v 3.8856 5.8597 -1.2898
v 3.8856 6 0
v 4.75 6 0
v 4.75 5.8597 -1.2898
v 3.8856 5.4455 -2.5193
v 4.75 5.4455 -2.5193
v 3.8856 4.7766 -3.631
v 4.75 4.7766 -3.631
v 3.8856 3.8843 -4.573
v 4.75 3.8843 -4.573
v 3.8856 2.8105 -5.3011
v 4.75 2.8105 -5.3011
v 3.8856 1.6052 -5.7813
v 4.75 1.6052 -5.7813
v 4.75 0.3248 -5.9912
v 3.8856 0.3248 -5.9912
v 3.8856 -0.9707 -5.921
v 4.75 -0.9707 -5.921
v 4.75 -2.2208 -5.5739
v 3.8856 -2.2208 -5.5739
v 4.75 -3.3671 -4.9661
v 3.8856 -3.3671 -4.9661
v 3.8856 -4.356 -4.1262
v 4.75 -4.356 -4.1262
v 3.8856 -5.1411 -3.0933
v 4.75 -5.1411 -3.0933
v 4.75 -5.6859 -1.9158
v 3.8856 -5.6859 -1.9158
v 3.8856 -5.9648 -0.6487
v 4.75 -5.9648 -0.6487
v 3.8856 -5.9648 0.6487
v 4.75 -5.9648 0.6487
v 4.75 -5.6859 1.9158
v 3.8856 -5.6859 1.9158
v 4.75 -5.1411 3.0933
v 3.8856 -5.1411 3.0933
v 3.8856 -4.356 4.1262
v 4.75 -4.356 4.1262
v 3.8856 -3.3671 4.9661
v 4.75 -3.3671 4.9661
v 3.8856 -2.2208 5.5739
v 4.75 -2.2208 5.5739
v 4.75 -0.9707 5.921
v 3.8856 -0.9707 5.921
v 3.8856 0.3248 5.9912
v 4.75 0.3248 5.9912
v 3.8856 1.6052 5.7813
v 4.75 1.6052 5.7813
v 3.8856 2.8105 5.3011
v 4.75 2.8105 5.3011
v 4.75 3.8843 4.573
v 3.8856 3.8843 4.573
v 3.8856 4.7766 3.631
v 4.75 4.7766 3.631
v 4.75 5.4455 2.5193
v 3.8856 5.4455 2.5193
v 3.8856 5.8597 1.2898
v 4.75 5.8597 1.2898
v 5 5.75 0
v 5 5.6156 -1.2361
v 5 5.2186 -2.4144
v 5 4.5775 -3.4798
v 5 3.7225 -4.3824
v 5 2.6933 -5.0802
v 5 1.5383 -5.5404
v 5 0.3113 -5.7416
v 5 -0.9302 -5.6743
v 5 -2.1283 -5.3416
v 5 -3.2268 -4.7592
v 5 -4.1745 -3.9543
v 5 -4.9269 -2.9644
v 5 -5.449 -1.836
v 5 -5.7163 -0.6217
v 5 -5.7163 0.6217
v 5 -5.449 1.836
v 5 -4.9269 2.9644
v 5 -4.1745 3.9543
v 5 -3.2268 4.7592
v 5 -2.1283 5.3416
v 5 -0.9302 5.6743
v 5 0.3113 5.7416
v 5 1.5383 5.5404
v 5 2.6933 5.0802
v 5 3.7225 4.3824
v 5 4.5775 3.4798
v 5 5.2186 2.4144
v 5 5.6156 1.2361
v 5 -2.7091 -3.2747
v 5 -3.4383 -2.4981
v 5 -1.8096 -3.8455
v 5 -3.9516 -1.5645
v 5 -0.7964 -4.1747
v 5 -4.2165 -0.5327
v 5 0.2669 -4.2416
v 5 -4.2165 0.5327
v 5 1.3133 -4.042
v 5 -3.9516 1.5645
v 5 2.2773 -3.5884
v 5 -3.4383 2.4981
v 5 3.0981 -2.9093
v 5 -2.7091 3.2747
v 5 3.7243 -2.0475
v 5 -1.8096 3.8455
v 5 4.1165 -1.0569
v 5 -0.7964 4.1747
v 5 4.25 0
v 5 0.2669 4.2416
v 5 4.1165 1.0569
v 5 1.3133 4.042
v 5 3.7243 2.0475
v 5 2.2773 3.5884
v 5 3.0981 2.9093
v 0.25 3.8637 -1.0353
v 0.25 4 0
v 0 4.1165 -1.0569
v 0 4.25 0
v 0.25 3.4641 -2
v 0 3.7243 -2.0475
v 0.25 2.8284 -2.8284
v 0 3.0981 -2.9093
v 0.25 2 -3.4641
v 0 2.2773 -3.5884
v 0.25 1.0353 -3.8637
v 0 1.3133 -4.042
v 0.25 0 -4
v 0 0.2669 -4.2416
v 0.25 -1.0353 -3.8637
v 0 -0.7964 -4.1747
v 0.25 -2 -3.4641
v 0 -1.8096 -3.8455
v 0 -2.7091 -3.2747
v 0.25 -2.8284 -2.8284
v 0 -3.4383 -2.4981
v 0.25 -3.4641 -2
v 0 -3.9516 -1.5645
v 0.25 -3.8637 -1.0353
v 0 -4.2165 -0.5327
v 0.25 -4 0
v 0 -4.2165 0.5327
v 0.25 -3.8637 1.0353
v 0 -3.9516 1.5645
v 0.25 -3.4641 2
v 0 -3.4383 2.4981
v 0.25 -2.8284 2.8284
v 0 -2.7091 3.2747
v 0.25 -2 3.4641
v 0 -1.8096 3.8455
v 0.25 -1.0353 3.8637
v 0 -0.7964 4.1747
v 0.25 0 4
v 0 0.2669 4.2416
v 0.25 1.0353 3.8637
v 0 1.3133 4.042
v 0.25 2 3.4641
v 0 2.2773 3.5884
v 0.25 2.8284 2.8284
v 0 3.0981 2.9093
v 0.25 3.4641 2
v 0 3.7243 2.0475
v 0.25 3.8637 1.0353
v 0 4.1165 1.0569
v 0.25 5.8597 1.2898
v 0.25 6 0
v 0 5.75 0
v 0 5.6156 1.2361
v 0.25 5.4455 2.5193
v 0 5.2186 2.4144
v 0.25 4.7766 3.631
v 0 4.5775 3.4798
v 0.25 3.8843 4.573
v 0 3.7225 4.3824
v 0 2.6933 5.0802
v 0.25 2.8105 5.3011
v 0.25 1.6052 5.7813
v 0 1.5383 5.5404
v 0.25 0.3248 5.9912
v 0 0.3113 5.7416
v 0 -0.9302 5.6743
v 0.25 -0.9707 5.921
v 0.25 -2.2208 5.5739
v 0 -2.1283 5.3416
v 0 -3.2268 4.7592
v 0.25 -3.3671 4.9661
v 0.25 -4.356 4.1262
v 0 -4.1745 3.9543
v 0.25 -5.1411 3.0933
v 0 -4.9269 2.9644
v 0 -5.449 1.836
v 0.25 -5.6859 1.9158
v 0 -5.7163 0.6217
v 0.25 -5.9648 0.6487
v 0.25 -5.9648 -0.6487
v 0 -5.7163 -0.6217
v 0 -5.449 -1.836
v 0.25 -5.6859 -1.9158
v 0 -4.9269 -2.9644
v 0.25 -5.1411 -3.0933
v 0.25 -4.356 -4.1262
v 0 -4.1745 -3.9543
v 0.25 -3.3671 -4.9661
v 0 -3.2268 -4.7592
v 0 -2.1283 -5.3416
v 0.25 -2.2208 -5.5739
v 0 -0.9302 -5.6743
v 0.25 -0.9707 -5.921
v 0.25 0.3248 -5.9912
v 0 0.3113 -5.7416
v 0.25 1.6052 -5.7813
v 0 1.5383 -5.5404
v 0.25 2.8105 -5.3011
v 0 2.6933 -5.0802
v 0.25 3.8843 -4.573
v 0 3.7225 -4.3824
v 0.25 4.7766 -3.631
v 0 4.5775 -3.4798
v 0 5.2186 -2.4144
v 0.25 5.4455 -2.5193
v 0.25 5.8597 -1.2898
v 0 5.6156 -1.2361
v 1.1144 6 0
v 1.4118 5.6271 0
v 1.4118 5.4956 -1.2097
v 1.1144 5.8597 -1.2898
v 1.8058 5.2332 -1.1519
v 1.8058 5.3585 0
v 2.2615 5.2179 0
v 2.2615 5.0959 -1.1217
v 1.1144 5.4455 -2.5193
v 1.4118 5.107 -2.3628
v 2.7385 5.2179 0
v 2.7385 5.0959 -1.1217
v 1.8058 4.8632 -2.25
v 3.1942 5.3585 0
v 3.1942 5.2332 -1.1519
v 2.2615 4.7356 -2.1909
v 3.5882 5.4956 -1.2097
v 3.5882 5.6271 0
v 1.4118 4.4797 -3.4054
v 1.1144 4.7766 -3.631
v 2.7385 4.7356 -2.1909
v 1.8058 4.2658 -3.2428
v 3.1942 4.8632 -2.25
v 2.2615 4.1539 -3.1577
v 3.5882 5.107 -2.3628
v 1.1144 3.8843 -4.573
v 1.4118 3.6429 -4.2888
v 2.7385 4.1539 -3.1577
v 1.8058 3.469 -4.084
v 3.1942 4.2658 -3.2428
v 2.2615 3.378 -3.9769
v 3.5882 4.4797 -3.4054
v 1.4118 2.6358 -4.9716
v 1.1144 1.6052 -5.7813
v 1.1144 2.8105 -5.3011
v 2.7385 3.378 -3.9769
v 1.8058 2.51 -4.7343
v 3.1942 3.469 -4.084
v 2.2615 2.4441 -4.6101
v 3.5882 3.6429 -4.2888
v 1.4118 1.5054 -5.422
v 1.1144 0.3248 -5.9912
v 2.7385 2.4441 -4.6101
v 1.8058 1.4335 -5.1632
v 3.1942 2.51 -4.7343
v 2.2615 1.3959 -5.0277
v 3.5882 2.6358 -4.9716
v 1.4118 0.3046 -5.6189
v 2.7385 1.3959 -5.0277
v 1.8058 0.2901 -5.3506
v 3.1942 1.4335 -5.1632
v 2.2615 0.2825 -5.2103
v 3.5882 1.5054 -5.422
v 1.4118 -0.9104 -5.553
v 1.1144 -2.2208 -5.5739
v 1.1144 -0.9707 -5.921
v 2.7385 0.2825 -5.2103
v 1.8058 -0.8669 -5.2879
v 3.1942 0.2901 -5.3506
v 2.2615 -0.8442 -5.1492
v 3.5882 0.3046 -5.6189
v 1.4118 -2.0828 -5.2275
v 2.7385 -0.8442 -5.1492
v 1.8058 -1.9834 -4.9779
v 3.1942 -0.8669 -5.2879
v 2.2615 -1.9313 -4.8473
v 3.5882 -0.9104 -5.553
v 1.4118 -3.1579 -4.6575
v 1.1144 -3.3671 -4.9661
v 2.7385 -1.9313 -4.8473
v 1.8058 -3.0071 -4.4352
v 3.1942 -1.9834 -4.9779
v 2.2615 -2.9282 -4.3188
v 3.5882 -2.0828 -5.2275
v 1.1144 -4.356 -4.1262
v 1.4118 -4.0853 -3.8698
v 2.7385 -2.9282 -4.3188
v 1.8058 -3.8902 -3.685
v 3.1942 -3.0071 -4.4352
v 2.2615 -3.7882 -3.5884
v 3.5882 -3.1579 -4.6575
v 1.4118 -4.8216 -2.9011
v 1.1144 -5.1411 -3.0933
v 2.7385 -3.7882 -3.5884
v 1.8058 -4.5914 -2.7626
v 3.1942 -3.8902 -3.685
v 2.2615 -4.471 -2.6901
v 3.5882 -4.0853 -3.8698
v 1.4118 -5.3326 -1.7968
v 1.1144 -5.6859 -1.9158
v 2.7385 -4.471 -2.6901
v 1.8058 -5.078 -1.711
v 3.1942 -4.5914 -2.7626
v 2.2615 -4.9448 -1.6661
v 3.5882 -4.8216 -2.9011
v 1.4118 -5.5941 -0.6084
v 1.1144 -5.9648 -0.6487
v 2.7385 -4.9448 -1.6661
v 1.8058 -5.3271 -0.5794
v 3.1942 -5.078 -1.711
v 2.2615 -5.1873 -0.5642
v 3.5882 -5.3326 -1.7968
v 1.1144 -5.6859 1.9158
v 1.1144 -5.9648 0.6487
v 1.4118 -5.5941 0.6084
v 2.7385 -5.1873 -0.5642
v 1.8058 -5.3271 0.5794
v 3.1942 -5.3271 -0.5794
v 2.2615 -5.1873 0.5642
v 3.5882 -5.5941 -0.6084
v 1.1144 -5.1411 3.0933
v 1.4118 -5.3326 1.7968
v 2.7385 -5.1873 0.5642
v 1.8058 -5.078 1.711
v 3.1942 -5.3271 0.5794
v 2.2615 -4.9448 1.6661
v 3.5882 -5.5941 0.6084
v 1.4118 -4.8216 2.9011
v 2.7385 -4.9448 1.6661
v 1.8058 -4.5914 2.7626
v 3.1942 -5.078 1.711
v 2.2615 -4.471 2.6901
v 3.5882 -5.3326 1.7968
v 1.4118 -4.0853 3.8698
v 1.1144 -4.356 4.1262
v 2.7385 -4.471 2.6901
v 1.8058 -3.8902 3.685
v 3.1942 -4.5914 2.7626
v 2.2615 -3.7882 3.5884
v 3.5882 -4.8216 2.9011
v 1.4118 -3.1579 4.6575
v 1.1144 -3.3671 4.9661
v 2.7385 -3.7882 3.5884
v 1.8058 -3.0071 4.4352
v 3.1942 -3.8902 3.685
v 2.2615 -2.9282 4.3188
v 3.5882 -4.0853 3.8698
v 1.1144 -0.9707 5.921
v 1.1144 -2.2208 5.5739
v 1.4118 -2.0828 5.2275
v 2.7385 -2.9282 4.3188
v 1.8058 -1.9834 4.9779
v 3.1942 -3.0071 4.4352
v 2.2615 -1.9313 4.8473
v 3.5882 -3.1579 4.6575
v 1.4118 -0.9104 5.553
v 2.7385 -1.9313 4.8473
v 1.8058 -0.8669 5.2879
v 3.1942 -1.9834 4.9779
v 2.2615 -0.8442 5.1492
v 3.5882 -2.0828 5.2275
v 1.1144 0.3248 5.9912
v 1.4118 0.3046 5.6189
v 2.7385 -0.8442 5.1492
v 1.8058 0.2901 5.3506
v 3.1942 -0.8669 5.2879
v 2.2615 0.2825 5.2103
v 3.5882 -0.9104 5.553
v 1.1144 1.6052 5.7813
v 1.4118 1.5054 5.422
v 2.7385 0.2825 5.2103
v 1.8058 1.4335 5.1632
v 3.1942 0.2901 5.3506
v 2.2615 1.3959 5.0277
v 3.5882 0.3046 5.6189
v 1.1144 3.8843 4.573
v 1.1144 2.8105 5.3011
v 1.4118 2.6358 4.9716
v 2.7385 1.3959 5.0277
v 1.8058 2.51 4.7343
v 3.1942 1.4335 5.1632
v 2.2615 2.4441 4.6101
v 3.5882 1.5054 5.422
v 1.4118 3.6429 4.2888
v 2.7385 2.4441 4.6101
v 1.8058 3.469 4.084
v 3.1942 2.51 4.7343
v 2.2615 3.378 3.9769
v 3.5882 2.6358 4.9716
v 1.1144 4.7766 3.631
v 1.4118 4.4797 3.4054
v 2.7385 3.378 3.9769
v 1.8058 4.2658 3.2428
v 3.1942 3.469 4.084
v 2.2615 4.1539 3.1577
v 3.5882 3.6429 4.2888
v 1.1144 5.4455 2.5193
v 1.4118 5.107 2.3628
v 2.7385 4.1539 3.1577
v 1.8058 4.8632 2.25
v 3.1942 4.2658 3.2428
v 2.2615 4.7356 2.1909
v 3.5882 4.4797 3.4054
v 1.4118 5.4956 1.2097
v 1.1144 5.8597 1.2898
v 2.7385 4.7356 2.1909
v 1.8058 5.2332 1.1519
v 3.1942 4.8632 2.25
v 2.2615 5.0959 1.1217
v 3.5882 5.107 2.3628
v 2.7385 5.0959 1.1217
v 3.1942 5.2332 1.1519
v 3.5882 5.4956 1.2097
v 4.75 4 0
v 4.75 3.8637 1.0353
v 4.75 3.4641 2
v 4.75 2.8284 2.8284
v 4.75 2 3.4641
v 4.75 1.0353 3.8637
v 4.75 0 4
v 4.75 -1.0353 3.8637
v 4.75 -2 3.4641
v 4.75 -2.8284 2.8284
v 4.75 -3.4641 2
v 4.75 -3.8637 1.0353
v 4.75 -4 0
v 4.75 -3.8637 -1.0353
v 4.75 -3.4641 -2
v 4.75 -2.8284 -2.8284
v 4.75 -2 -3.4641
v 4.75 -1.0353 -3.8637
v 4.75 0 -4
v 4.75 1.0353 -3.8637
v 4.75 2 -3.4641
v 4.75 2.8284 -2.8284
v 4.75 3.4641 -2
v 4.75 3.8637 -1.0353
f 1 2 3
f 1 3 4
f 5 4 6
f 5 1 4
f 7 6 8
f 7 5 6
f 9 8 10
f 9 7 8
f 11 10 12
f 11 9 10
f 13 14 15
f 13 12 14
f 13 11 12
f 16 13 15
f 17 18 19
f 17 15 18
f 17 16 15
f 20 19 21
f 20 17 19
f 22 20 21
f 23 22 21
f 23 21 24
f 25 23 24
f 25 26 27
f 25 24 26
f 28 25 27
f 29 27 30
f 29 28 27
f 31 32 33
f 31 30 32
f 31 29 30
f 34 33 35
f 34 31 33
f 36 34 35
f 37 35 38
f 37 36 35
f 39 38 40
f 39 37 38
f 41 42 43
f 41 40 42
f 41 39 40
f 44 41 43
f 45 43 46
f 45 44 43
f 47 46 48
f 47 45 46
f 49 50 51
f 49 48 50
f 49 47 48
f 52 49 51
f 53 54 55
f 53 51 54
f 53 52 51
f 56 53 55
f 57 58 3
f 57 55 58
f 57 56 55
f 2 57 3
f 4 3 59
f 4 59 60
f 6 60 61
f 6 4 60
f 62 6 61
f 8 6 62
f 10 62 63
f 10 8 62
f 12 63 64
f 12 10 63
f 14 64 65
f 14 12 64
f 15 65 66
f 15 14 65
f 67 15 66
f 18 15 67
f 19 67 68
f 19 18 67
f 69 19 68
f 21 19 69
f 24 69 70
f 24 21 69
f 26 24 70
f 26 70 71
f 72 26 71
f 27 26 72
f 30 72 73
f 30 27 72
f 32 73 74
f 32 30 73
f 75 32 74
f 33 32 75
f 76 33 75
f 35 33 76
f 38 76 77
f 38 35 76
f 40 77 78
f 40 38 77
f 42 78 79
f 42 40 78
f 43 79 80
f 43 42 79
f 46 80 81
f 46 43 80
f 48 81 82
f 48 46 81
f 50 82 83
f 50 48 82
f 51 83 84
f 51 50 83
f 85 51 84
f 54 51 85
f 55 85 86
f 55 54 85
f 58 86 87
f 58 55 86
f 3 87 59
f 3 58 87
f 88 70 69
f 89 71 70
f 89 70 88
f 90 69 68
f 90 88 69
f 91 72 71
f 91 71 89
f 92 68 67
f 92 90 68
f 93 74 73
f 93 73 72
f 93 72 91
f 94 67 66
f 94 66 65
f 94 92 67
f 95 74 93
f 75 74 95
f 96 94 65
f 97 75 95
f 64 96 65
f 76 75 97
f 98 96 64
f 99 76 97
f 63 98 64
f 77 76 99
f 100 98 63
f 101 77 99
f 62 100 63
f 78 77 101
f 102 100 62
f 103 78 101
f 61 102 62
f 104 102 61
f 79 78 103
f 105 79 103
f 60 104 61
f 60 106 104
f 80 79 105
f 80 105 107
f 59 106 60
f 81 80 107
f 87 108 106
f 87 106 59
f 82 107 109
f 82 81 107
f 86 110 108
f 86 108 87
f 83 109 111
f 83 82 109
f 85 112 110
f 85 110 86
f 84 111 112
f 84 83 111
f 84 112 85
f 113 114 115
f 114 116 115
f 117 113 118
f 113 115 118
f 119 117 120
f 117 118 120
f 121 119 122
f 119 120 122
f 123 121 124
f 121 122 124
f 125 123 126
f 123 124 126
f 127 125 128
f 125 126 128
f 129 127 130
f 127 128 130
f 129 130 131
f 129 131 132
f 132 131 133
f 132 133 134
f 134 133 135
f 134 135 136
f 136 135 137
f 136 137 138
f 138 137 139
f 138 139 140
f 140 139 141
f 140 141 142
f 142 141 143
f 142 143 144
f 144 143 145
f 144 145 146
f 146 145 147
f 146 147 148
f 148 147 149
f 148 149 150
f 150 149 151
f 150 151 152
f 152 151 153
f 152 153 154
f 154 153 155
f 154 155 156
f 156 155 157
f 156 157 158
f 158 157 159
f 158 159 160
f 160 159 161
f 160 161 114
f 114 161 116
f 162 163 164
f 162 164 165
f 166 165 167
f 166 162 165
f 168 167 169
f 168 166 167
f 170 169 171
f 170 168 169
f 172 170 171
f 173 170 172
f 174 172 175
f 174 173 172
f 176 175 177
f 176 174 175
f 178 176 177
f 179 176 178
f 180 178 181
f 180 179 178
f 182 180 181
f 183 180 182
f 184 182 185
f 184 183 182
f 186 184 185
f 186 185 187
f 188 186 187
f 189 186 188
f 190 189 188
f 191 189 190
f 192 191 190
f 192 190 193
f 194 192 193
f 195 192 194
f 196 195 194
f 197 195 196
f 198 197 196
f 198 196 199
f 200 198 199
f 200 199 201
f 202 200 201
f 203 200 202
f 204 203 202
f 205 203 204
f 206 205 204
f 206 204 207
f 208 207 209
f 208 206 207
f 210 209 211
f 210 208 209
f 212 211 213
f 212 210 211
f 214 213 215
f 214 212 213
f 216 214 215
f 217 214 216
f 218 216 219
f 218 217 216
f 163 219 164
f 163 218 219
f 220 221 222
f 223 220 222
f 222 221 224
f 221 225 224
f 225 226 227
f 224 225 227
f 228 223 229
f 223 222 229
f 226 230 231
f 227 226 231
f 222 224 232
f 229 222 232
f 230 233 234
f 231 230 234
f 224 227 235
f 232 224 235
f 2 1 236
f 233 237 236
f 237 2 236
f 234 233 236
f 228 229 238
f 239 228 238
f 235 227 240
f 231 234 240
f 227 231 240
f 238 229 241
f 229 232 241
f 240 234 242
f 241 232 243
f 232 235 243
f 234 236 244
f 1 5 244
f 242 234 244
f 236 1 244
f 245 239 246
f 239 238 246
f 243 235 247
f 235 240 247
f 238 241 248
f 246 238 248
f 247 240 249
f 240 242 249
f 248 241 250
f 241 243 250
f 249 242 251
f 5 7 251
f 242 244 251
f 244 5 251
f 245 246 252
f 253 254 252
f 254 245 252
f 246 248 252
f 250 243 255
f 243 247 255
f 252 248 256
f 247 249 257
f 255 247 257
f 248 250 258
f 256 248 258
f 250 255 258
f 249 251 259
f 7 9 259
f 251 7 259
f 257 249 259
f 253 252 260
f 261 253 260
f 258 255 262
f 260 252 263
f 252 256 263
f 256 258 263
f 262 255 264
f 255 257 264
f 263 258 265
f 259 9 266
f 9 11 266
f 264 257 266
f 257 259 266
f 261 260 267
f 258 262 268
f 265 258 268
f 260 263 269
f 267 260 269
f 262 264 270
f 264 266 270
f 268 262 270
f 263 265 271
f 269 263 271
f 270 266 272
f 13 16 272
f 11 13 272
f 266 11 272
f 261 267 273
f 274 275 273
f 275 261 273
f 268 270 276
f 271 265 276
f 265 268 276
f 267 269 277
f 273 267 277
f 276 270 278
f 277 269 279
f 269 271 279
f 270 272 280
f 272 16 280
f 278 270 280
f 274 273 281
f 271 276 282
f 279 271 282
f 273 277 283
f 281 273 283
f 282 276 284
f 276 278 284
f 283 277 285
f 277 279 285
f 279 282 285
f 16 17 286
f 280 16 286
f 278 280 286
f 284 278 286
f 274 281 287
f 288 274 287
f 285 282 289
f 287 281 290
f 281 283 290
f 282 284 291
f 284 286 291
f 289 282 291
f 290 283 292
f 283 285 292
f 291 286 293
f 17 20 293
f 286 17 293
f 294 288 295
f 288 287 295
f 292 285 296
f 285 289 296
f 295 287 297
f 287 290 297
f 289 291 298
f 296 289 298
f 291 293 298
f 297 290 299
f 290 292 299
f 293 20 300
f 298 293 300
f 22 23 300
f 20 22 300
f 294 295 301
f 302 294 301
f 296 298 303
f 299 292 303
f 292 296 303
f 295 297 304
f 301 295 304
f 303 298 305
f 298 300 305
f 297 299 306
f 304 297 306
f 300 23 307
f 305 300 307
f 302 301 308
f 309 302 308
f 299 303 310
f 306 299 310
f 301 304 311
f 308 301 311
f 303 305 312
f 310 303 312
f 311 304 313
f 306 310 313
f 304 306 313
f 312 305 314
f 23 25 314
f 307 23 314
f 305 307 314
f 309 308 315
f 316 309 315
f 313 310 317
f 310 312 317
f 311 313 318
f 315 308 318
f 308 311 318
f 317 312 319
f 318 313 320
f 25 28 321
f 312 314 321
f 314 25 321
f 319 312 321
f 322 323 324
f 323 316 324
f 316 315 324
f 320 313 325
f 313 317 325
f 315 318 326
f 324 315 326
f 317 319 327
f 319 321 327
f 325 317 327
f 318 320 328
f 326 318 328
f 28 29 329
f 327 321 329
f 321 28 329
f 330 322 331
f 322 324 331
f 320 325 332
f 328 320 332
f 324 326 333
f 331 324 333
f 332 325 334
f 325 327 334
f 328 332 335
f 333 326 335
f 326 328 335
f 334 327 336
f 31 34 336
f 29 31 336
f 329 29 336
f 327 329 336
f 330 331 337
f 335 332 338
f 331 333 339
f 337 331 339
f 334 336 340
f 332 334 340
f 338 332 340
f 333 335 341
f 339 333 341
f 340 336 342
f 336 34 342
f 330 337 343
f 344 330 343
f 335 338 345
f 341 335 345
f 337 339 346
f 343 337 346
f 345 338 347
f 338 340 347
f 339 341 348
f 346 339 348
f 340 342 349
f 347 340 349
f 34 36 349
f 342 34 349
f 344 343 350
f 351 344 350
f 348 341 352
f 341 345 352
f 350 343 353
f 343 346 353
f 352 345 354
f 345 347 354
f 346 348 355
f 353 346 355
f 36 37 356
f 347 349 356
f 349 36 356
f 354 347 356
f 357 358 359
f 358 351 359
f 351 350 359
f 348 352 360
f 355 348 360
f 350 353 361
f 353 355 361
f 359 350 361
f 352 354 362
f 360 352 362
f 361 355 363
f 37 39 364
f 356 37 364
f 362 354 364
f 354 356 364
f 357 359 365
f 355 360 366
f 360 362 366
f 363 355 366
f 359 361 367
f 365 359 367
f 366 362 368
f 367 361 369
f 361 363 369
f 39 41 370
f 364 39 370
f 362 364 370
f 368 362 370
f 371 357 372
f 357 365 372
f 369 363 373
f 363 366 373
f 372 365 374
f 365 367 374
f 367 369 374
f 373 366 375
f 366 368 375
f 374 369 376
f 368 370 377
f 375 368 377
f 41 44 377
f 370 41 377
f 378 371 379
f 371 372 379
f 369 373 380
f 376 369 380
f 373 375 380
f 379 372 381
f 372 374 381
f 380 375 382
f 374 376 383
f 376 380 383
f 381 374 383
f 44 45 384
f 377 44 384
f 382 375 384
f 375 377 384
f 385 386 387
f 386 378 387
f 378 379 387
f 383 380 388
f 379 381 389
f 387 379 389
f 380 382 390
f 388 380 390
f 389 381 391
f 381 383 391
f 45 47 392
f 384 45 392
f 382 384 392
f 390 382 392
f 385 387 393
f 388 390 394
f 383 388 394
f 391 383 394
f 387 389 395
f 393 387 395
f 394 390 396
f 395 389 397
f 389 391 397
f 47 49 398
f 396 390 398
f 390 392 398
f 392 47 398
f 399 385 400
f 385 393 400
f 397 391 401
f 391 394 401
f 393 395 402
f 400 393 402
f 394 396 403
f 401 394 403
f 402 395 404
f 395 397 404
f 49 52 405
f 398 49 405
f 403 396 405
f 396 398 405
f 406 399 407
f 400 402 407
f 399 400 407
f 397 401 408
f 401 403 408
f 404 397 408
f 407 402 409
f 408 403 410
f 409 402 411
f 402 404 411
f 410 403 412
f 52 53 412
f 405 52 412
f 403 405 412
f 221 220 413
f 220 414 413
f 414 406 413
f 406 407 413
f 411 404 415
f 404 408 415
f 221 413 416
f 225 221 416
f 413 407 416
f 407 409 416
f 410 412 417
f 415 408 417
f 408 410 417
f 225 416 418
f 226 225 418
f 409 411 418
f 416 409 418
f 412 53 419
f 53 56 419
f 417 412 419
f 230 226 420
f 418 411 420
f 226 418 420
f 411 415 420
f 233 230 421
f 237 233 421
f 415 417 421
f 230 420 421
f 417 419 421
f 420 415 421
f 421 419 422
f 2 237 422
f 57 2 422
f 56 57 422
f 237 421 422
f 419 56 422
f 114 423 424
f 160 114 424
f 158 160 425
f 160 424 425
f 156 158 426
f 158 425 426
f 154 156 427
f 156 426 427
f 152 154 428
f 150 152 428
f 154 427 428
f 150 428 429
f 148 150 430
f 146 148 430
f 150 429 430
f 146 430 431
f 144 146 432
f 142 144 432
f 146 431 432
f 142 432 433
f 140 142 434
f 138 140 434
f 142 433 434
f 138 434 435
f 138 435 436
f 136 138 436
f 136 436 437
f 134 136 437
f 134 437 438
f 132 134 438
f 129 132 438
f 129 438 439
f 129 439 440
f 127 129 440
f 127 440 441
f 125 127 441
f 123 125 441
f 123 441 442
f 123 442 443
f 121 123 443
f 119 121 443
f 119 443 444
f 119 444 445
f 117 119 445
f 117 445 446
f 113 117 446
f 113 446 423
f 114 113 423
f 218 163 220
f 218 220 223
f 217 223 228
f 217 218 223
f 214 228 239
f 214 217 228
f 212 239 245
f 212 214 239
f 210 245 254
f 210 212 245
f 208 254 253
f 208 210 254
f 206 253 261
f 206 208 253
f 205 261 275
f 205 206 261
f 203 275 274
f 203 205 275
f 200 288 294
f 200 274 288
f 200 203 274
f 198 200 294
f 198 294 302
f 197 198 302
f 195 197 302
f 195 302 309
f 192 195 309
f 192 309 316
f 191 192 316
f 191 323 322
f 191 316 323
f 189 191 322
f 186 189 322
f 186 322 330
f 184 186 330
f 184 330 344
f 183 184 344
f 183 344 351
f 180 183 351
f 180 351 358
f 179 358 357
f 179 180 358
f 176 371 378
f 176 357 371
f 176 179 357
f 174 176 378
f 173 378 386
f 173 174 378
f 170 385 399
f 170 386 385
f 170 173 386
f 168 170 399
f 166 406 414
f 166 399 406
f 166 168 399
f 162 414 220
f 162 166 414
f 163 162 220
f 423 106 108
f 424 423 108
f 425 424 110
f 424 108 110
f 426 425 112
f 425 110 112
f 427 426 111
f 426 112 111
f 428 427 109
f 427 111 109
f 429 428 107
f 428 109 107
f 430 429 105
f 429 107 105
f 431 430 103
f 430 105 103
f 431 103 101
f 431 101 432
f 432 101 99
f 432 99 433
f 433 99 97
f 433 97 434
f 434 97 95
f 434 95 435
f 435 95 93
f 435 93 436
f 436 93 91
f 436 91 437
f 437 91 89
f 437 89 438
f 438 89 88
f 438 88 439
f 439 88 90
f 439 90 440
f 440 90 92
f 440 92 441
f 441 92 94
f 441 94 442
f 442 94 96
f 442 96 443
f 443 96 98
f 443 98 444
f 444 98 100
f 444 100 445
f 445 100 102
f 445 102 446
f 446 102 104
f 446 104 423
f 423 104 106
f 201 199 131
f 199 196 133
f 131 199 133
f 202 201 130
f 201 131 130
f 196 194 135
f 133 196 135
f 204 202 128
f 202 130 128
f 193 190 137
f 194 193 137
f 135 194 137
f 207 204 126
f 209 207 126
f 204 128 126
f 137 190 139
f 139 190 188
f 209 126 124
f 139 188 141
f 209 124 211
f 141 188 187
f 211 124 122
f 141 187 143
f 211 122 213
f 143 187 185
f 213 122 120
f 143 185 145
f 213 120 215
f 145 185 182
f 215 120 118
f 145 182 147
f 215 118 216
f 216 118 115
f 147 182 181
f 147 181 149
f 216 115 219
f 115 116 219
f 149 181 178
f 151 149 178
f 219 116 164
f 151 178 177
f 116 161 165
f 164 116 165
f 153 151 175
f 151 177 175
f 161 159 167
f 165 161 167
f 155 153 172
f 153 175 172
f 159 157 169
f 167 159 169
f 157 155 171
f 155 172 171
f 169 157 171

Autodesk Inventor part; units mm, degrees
sketch "Sketch_3" plane through (0, 0, 0) normal (0, 0, 1) x (1, 0, 0)
  line L0 (5, 0) -> (0, 0)
  line L1 (0, 4.25) -> (0.25, 4)
  line L2 (0.25, 4) -> (4.75, 4)
  line L3 (4.75, 4) -> (5, 4.25)
  line L4 (5, 4.25) -> (5, 5.75)
  line L5 (5, 5.75) -> (4.75, 6)
  line L6 (4.75, 6) -> (3.8856, 6)
  arc A0 (1.1144, 6) -> (3.8856, 6) centre (2.5, 6.8) ccw
  line L7 (1.1144, 6) -> (0.25, 6)
  line L8 (0.25, 6) -> (0, 5.75)
  line L9 (0, 5.75) -> (0, 4.25)
revolve "Revolution1" add sketch "Sketch_3" angle 360 about axis through (5, 0, 0) along (1, 0, 0)
ref_plane "Dummy_IR_XY" through (0, 0, 0) normal (1, 0, 0) x (0, 0, -1)
ref_plane "Dummy_IR_YZ" through (0, 0, 0) normal (0, 0, -1) x (0, 1, 0)
ref_plane "Dummy_IR_ZX" through (0, 0, 0) normal (0, 1, 0) x (1, 0, 0)
ref_plane "IR_OR_XY" through (0, 0, 0) normal (1, 0, 0) x (0, 0, -1)
ref_plane "IR_OR_YZ" through (0, 0, 0) normal (0, 0, -1) x (0, 1, 0)
ref_plane "IR_OR_ZX" through (0, 0, 0) normal (0, 1, 0) x (1, 0, 0)
properties part number "040102DR-18-H8_ir_CPY"
